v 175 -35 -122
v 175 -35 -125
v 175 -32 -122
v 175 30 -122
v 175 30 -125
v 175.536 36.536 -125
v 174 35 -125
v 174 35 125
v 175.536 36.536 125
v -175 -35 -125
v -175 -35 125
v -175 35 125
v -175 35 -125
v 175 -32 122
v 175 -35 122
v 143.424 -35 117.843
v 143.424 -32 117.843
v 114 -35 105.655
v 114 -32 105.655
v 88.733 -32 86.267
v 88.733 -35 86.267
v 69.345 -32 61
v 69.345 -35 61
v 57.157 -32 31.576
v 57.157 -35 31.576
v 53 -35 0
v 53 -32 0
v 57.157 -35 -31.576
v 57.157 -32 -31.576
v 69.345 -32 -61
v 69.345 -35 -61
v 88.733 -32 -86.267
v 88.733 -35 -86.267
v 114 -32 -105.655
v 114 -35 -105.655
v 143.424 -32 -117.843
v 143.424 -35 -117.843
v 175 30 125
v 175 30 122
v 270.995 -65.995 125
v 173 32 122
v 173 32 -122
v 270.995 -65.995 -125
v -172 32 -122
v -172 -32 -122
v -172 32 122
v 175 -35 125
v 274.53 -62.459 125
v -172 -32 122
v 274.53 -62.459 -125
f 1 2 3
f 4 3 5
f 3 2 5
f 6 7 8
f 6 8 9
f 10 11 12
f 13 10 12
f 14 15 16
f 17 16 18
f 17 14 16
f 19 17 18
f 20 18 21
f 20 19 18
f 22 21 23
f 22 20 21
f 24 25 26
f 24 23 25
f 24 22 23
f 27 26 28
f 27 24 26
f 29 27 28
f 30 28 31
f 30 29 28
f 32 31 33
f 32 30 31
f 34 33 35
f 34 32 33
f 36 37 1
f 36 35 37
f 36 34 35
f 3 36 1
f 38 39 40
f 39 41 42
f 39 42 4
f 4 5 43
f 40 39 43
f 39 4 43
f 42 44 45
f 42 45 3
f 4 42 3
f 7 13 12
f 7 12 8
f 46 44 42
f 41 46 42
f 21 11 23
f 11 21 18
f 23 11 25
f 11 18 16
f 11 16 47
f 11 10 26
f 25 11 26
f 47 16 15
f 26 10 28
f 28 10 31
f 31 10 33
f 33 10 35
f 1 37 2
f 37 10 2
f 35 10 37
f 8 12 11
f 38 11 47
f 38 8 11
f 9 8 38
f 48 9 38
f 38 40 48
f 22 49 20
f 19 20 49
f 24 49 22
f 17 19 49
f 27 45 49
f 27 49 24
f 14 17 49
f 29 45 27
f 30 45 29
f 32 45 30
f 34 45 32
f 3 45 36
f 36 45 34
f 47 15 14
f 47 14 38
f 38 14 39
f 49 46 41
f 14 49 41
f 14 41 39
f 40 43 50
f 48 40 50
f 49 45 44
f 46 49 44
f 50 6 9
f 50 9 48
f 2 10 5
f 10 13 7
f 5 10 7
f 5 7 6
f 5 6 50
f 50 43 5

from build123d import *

# Parameters (mm, degrees)
BOX002_W               = 140
BOX002_H               = 5
BOX002_DEPTH           = 250
BOX002_PLACEMENT_ANGLE = -45
CYLINDER_R             = 122
CYLINDER_DEPTH         = 20
CYLINDER_ROLL_ANGLE    = 90
BOX001_W               = 350
BOX001_H               = 64
BOX001_DEPTH           = 244
BOX_W                  = 350
BOX_H                  = 70
BOX_DEPTH              = 250


with BuildPart() as cube002:
    # Box002 → Box002 (new body)
    with BuildSketch(Plane.XY):
        with Locations((70, 2.5)):
            Rectangle(BOX002_W, BOX002_H)
    extrude(amount=BOX002_DEPTH)


with BuildPart() as cube002_1:
    # Box002 placement: moved
    add(cube002.part.moved(Location((172, 33, -125))).rotate(Axis((172, 33, -125), (0, 0, 1)), BOX002_PLACEMENT_ANGLE))


with BuildPart() as cylinder:
    # Cylinder → Cylinder (new body)
    with BuildSketch(Plane.XY):
        Circle(CYLINDER_R)
    extrude(amount=CYLINDER_DEPTH)


with BuildPart() as cylinder_1:
    # Cylinder roll: moved
    add(cylinder.part.rotate(Axis((0, 0, 0), (1, 0, 0)), CYLINDER_ROLL_ANGLE))


with BuildPart() as cylinder_2:
    # Cylinder placement: moved
    add(cylinder_1.part.moved(Location((175, -20, 0))))


with BuildPart() as cube001:
    # Box001 → Box001 (new body)
    with BuildSketch(Plane(origin=(-172, -32, -122), x_dir=(1, 0, 0), z_dir=(0, 0, 1))):
        with Locations((175, 32)):
            Rectangle(BOX001_W, BOX001_H)
    extrude(amount=BOX001_DEPTH)


with BuildPart() as fusion:
    # Box → Box (new body)
    with BuildSketch(Plane(origin=(-175, -35, -125), x_dir=(1, 0, 0), z_dir=(0, 0, 1))):
        with Locations((175, 35)):
            Rectangle(BOX_W, BOX_H)
    extrude(amount=BOX_DEPTH)

    # Cut: cut Cube001
    add(cube001.part, mode=Mode.SUBTRACT)

    # Cut001: cut Cylinder
    add(cylinder_2.part, mode=Mode.SUBTRACT)

    # Fusion: union Cube002
    add(cube002_1.part)


solid = fusion.part
